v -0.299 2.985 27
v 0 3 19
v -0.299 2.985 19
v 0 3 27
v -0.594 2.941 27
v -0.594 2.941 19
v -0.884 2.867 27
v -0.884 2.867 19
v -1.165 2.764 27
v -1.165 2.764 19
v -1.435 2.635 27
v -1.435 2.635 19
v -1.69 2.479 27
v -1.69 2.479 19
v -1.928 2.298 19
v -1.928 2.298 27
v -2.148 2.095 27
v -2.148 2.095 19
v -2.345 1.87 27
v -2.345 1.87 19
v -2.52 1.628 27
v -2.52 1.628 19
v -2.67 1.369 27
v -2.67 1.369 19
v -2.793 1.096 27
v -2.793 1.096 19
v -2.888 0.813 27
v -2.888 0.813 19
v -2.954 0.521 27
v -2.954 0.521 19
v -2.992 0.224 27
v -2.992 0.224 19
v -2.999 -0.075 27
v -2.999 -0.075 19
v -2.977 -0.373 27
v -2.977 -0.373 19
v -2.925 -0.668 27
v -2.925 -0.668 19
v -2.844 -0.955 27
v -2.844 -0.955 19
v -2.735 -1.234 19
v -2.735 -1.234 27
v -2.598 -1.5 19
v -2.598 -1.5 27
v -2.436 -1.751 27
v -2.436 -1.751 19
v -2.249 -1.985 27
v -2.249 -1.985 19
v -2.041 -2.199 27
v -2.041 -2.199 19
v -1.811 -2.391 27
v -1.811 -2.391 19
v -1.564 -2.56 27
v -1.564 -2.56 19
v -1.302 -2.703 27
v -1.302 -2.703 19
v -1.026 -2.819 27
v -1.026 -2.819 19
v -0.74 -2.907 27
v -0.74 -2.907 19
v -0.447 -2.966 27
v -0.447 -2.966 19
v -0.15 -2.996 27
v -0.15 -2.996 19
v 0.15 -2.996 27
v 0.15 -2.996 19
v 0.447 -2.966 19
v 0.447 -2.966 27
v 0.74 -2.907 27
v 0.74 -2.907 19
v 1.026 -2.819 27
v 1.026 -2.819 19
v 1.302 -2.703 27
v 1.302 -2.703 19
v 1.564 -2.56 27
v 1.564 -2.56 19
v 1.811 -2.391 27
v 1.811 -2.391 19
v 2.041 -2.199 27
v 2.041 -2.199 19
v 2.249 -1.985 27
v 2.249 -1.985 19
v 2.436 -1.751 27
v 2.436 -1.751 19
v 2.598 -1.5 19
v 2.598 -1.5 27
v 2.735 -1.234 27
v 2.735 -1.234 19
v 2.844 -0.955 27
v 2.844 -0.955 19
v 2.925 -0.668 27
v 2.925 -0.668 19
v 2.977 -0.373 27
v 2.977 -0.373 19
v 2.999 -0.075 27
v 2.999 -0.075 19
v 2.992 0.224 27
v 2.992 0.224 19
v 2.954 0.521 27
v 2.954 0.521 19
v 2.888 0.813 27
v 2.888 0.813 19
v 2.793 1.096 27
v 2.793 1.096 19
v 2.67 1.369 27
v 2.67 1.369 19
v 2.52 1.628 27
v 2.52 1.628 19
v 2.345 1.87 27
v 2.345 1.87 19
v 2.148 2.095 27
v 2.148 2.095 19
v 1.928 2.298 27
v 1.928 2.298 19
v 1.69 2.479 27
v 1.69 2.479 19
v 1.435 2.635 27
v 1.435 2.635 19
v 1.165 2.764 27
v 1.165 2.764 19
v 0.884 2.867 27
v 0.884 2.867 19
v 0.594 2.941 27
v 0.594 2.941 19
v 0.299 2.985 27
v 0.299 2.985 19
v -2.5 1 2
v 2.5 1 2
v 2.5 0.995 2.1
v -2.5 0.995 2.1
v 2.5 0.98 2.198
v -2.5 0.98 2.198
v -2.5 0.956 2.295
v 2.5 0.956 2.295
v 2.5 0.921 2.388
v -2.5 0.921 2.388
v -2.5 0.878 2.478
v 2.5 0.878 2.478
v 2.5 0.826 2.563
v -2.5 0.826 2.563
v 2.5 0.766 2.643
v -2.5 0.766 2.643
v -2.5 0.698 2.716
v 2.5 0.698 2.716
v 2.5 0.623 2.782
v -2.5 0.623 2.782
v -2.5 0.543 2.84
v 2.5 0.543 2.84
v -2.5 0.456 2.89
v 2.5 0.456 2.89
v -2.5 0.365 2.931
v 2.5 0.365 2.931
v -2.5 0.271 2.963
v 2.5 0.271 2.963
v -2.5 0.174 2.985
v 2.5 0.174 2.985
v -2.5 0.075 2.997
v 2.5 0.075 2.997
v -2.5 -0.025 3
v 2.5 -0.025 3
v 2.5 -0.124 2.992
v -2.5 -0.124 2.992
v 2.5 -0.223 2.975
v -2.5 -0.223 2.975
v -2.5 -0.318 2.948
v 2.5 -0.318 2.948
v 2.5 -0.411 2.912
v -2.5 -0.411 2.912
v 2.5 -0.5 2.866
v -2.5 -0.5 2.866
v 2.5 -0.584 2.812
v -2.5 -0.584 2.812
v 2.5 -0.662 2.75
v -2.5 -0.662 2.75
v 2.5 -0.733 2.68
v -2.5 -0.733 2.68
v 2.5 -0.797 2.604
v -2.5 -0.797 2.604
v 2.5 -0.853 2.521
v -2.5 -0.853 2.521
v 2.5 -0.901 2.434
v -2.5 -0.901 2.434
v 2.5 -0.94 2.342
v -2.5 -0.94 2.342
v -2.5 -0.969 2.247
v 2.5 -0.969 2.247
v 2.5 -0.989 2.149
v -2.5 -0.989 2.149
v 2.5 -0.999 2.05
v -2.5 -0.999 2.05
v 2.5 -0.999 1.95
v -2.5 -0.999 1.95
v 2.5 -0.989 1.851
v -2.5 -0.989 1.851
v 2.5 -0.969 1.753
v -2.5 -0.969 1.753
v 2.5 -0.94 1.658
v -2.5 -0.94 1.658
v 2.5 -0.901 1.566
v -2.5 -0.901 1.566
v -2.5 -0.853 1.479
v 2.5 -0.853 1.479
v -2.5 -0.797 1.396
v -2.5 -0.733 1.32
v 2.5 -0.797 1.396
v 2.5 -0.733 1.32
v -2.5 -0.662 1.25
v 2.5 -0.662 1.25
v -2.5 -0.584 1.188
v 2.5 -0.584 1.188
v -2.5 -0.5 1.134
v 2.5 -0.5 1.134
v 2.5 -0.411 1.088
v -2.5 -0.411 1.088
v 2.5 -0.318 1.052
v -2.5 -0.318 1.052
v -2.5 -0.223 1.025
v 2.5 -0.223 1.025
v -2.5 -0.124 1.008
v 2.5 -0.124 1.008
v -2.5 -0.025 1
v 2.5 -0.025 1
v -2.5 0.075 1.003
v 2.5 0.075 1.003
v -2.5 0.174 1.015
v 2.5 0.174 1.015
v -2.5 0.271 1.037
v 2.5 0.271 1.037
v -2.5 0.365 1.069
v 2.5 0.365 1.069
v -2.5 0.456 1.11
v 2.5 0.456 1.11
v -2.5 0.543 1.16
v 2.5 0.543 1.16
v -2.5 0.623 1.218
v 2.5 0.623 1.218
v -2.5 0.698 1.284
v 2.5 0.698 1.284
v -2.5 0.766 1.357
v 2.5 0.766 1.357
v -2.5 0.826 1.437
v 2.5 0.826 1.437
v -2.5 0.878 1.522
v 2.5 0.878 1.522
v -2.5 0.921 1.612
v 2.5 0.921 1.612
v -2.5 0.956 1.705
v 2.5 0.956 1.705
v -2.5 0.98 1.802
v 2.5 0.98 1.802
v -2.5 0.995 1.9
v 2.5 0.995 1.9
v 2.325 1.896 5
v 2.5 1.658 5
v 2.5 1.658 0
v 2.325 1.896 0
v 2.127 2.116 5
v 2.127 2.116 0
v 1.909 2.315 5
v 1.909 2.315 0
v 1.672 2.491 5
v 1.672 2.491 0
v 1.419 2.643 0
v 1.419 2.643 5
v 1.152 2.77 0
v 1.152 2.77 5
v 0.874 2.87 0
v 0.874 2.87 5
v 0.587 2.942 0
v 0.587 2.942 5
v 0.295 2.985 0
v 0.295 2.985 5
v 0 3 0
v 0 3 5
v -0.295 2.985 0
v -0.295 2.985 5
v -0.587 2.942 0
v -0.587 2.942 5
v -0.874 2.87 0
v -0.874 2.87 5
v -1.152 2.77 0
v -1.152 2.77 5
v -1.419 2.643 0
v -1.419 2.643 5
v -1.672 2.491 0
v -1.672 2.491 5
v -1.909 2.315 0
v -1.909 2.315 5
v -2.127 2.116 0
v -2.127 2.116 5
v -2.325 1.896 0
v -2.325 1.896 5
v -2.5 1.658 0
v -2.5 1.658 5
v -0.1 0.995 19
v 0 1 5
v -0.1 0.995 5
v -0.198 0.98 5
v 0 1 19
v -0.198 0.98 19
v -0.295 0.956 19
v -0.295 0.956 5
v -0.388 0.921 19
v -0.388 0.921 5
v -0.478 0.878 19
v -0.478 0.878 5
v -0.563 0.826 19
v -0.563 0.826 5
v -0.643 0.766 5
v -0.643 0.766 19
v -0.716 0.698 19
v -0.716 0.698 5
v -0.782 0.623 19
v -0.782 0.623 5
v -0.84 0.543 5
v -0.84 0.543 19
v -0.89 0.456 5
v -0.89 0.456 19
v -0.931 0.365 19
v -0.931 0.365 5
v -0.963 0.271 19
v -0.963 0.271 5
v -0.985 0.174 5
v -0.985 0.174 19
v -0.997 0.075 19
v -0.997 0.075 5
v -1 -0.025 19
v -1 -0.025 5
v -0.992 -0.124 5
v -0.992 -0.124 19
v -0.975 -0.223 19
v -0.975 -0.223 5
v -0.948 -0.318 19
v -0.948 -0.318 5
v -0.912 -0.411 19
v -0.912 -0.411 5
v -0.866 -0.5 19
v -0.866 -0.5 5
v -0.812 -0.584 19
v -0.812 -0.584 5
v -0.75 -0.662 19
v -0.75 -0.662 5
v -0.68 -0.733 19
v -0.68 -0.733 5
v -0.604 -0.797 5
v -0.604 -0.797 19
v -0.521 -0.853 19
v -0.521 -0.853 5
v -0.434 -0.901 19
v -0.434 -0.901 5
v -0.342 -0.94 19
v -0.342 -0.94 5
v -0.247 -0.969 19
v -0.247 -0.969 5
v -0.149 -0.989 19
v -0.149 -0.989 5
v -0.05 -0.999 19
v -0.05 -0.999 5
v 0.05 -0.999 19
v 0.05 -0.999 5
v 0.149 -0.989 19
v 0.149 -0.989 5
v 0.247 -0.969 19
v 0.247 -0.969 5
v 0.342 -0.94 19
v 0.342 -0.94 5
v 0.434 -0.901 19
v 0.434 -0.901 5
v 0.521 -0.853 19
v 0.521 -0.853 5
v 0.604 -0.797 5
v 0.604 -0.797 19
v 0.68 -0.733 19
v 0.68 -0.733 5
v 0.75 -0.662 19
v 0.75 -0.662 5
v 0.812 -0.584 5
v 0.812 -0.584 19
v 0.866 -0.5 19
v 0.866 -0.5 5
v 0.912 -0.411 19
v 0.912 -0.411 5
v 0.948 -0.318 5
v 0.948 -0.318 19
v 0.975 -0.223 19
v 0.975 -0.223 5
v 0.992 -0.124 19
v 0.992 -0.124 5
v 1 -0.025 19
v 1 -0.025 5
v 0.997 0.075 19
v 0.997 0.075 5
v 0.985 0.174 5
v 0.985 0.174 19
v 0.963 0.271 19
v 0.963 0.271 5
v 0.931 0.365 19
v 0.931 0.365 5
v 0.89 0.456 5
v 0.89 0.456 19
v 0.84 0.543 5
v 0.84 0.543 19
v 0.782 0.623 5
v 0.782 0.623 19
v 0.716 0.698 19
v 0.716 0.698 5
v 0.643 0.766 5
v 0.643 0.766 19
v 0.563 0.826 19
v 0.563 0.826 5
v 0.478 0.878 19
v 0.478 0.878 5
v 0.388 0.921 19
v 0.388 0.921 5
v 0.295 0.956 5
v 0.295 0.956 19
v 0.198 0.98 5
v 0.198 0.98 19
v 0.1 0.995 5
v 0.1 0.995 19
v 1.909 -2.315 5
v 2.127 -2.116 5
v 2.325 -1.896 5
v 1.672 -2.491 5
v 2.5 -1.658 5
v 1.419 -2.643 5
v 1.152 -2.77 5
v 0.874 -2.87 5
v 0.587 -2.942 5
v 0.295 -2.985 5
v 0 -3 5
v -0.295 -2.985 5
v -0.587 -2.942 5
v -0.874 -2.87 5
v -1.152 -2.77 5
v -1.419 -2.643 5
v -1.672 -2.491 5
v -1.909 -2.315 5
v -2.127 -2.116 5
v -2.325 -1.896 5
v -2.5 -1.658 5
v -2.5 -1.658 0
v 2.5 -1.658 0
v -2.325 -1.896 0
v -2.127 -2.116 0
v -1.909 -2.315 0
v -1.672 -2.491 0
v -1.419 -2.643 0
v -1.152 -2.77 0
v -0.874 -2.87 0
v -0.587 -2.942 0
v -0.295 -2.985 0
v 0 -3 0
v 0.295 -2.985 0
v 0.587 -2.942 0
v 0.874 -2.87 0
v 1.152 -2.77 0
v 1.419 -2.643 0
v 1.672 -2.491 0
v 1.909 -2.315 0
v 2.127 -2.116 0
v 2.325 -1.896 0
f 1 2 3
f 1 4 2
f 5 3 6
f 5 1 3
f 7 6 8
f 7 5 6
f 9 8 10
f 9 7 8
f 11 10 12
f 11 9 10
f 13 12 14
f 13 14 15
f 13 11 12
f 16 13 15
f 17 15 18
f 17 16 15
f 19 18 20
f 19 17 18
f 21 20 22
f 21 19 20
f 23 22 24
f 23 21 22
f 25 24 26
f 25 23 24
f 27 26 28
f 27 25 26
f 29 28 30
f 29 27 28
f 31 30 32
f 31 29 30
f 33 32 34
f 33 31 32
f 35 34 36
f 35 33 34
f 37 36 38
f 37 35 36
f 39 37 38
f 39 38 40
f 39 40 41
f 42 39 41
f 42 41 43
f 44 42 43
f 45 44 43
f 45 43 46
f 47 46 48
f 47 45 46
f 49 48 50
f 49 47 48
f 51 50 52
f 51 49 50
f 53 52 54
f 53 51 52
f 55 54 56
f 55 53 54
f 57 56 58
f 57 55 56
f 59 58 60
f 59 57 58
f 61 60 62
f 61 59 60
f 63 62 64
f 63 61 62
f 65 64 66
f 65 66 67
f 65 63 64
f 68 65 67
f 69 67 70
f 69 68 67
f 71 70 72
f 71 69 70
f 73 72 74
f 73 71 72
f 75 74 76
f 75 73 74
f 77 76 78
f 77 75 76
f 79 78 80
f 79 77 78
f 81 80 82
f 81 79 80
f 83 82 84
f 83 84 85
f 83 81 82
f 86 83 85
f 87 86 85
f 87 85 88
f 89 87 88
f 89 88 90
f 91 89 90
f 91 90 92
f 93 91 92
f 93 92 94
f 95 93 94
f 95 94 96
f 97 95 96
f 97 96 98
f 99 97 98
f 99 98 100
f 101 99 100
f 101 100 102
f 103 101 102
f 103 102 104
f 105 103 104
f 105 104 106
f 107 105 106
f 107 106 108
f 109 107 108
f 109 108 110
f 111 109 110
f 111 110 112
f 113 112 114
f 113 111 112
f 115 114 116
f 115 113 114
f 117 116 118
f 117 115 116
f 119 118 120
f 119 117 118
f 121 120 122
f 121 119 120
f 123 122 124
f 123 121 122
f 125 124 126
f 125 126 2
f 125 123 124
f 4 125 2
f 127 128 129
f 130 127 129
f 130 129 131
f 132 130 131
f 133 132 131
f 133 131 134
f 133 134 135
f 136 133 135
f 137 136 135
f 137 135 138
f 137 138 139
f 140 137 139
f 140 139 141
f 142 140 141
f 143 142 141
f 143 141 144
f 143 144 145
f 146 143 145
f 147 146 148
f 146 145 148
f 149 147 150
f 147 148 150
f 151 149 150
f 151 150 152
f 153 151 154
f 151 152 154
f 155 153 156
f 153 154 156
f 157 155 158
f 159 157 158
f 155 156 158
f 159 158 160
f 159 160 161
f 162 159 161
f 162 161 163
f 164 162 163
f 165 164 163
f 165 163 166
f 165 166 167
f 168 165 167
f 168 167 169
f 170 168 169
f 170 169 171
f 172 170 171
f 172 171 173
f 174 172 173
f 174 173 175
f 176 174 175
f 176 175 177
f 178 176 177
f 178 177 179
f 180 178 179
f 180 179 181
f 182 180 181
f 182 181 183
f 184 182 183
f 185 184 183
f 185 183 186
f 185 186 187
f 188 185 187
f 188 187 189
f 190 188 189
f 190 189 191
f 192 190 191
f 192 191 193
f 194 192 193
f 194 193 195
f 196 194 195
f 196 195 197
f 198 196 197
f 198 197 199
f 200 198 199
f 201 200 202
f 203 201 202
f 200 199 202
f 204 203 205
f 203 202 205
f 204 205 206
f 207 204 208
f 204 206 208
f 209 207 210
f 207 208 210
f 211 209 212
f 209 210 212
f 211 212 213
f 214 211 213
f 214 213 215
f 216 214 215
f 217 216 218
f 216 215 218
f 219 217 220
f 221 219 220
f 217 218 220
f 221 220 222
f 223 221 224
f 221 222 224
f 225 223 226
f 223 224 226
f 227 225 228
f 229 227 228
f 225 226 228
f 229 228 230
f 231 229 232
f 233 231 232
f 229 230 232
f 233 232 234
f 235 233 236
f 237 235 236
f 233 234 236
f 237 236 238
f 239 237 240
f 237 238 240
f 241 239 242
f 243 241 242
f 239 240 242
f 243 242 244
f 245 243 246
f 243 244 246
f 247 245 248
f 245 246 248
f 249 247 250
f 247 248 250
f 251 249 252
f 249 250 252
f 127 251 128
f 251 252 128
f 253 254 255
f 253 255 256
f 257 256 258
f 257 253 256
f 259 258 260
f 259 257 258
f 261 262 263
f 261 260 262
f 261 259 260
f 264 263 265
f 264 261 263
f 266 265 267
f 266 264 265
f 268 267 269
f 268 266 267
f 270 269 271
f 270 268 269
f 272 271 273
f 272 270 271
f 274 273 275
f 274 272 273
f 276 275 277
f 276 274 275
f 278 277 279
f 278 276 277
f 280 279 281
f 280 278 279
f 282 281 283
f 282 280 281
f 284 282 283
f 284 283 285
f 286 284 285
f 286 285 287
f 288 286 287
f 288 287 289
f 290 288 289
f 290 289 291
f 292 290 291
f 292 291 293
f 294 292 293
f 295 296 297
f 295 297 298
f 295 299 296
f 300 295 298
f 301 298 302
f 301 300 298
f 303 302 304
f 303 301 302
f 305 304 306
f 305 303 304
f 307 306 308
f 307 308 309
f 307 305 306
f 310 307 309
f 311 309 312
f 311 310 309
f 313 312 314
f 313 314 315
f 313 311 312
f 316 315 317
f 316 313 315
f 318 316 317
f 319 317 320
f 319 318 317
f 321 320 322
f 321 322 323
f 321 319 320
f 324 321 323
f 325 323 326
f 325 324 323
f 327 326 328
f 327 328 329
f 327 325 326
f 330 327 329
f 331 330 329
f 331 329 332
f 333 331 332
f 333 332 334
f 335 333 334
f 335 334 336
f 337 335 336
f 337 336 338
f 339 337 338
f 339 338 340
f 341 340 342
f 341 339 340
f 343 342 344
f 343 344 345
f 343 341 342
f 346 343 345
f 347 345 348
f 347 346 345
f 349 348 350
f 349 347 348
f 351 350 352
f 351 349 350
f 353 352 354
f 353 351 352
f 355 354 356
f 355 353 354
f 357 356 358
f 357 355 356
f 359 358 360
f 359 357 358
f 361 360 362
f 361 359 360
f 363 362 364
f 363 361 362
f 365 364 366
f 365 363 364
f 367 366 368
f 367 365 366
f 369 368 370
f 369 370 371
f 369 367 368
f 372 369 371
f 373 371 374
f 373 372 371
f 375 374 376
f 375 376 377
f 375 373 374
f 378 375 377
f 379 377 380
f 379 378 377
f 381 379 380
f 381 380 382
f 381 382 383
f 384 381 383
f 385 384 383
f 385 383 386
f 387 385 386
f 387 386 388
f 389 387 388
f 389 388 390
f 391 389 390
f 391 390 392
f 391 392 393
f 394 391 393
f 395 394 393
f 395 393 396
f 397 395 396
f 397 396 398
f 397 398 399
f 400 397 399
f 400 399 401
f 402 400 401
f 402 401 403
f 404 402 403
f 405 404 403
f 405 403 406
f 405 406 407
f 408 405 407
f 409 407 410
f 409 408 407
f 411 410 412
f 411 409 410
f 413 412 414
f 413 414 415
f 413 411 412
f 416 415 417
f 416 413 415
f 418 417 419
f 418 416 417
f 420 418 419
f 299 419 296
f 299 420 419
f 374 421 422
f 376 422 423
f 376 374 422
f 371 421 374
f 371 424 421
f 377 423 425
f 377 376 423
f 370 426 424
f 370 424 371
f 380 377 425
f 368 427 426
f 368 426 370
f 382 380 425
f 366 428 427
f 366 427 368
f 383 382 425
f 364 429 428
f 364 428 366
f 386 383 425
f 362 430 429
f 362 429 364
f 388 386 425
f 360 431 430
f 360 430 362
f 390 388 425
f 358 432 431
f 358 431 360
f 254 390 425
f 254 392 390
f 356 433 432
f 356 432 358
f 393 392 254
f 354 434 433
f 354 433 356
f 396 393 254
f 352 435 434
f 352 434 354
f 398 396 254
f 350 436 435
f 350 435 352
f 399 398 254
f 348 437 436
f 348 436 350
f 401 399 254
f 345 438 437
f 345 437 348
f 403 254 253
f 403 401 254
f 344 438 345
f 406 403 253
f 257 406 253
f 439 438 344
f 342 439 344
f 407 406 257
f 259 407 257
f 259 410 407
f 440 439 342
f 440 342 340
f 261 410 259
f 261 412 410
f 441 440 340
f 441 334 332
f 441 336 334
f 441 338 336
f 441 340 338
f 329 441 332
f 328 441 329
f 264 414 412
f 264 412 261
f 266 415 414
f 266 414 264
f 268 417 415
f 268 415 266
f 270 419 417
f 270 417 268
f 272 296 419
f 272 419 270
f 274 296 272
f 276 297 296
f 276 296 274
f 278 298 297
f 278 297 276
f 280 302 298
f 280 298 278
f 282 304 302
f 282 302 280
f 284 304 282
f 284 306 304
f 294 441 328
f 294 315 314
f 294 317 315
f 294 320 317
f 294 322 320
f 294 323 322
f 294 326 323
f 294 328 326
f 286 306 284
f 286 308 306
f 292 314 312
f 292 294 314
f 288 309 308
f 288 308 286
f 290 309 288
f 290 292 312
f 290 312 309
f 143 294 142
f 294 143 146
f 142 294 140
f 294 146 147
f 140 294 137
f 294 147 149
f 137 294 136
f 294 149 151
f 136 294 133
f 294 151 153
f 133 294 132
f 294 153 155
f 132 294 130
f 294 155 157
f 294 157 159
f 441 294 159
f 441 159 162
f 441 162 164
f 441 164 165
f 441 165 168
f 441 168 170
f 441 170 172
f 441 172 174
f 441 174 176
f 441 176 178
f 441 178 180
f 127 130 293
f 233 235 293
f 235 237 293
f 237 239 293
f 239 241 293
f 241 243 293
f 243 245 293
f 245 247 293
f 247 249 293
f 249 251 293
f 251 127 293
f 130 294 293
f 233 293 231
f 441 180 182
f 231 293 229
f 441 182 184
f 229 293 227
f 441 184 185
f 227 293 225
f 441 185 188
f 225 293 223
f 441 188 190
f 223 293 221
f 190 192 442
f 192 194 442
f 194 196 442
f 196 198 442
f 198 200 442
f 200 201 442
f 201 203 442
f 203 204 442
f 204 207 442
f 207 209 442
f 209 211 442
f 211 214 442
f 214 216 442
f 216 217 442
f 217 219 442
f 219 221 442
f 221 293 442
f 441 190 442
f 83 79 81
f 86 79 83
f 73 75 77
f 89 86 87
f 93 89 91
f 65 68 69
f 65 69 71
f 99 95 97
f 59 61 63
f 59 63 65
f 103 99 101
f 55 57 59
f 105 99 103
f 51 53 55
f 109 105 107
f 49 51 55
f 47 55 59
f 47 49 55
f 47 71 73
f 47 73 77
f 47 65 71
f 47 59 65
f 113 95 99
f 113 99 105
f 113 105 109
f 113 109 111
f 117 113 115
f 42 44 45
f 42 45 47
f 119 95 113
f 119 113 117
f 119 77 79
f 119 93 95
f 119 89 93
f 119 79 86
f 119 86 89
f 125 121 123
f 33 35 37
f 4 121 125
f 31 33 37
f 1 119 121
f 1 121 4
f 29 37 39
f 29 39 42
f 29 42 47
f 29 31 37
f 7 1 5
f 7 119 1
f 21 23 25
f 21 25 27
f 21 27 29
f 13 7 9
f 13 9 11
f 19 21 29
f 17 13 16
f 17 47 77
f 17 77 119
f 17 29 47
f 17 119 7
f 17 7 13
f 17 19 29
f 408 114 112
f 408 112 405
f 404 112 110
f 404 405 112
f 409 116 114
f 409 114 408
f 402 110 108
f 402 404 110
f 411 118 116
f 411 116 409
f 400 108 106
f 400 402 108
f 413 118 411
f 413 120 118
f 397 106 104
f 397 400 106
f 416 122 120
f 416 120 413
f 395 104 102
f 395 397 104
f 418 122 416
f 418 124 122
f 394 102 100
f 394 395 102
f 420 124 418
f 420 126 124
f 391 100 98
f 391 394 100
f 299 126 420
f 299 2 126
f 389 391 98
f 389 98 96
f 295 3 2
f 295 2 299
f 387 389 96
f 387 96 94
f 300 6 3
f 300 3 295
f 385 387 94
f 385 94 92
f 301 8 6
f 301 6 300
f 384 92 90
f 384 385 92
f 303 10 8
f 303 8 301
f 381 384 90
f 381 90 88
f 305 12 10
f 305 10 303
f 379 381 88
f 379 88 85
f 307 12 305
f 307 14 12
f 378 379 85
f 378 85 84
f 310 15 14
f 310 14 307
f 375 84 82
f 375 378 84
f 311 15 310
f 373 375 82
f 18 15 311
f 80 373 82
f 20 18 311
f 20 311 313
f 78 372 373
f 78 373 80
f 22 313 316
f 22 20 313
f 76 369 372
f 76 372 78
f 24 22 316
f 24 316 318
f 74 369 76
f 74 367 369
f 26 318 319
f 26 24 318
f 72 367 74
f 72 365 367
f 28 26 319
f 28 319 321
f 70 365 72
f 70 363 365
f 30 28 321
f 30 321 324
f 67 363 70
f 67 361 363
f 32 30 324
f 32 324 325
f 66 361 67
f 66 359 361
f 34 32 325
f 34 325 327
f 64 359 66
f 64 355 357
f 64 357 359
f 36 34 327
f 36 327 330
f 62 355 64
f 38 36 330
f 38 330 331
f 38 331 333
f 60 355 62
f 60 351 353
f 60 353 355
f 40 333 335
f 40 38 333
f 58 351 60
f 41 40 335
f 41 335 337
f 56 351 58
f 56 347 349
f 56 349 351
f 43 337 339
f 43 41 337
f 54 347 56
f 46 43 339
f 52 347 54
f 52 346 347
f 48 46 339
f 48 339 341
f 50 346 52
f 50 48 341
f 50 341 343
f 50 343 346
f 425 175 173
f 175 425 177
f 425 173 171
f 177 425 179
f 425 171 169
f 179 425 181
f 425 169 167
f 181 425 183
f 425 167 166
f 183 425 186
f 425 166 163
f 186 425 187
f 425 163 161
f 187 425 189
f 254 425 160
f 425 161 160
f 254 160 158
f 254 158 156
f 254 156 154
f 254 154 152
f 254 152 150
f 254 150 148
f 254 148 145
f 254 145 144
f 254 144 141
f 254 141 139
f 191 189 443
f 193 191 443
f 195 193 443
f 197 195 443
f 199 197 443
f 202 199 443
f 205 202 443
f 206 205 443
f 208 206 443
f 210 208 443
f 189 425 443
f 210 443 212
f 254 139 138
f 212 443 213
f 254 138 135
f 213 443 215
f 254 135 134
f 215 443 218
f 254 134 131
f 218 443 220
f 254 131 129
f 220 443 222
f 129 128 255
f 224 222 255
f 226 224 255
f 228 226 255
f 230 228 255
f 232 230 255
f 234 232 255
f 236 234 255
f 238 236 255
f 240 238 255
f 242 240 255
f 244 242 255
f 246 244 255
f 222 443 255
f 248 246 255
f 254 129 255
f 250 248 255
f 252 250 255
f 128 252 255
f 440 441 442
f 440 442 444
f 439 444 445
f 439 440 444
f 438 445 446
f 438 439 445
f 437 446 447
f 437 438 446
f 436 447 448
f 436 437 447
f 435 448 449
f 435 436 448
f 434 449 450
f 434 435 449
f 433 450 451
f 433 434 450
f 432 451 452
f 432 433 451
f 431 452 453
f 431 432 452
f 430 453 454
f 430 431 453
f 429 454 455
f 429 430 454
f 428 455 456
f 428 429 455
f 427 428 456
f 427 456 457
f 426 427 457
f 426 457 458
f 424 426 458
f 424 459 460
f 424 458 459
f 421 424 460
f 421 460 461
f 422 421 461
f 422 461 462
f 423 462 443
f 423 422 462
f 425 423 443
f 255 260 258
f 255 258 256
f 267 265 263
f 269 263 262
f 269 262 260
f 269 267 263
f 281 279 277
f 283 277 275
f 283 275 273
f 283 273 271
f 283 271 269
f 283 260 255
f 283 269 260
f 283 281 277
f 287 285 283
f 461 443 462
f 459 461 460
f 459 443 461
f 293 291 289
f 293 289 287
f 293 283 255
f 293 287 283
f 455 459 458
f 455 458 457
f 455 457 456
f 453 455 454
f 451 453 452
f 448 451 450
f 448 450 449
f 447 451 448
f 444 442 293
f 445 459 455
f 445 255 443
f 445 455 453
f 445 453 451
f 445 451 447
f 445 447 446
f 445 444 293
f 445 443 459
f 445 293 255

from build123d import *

# Parameters (mm, degrees)
F3_DEPTH = 6
F5_DEPTH = 6
F6_R     = 1
F7_DEPTH = 5.501


with BuildPart() as f1:
    # F0 (on Right) → F1 (revolve)
    with BuildSketch(Plane.YZ):
        Polygon((0, 27), (0, 0), (3, 0), (3, 5), (1, 5), (1, 19), (3, 19), (3, 27), align=None)
    revolve(axis=Axis((0, 0, 14.70128), (0, 0, 1)))

    # F2 (on face) → F3 (cut)
    with BuildSketch(Plane(origin=(0, 0, 0), x_dir=(1, 0, 0), z_dir=(0, 0, -1))):
        with BuildLine():
            Line((2.5, -2.987541), (3.128111, -2.987541))
            Line((3.128111, -2.987541), (3.128111, 3.060273))
            Line((3.128111, 3.060273), (2.5, 3.060273))
            Line((2.5, 3.060273), (2.5, 1.658312))
            ThreePointArc((2.5, 1.658312), (2.872281, 0.866025), (3, 0))
            ThreePointArc((3, 0), (2.872281, -0.866025), (2.5, -1.658312))
            Line((2.5, -1.658312), (2.5, -2.987541))
        make_face()
        with BuildLine():
            Line((2.5, 1.658312), (2.5, -1.658312))
            ThreePointArc((2.5, -1.658312), (2.872281, -0.866025), (3, 0))
            ThreePointArc((3, 0), (2.872281, 0.866025), (2.5, 1.658312))
        make_face()
    extrude(amount=-F3_DEPTH, mode=Mode.SUBTRACT)

    # F4 (on face) → F5 (cut)
    with BuildSketch(Plane(origin=(0, 0, 0), x_dir=(1, 0, 0), z_dir=(0, 0, -1))):
        with BuildLine():
            Line((-5.039785, -4.02743), (-2.5, -4.02743))
            Line((-2.5, -4.02743), (-2.5, -1.658312))
            ThreePointArc((-2.5, -1.658312), (-3, 0), (-2.5, 1.658312))
            Line((-2.5, 1.658312), (-2.5, 4.430752))
            Line((-2.5, 4.430752), (-5.039785, 4.430752))
            Line((-5.039785, 4.430752), (-5.039785, -4.02743))
        make_face()
        with BuildLine():
            ThreePointArc((-2.5, 1.658312), (-3, 0), (-2.5, -1.658312))
            Line((-2.5, -1.658312), (-2.5, 1.658312))
        make_face()
    extrude(amount=-F5_DEPTH, mode=Mode.SUBTRACT)

    # F6 (on face) → F7 (cut, through all)
    with BuildSketch(Plane.YZ.offset(2.5)):
        with Locations((0, 2)):
            Circle(F6_R)
    extrude(amount=-F7_DEPTH, mode=Mode.SUBTRACT)


solid = f1.part
